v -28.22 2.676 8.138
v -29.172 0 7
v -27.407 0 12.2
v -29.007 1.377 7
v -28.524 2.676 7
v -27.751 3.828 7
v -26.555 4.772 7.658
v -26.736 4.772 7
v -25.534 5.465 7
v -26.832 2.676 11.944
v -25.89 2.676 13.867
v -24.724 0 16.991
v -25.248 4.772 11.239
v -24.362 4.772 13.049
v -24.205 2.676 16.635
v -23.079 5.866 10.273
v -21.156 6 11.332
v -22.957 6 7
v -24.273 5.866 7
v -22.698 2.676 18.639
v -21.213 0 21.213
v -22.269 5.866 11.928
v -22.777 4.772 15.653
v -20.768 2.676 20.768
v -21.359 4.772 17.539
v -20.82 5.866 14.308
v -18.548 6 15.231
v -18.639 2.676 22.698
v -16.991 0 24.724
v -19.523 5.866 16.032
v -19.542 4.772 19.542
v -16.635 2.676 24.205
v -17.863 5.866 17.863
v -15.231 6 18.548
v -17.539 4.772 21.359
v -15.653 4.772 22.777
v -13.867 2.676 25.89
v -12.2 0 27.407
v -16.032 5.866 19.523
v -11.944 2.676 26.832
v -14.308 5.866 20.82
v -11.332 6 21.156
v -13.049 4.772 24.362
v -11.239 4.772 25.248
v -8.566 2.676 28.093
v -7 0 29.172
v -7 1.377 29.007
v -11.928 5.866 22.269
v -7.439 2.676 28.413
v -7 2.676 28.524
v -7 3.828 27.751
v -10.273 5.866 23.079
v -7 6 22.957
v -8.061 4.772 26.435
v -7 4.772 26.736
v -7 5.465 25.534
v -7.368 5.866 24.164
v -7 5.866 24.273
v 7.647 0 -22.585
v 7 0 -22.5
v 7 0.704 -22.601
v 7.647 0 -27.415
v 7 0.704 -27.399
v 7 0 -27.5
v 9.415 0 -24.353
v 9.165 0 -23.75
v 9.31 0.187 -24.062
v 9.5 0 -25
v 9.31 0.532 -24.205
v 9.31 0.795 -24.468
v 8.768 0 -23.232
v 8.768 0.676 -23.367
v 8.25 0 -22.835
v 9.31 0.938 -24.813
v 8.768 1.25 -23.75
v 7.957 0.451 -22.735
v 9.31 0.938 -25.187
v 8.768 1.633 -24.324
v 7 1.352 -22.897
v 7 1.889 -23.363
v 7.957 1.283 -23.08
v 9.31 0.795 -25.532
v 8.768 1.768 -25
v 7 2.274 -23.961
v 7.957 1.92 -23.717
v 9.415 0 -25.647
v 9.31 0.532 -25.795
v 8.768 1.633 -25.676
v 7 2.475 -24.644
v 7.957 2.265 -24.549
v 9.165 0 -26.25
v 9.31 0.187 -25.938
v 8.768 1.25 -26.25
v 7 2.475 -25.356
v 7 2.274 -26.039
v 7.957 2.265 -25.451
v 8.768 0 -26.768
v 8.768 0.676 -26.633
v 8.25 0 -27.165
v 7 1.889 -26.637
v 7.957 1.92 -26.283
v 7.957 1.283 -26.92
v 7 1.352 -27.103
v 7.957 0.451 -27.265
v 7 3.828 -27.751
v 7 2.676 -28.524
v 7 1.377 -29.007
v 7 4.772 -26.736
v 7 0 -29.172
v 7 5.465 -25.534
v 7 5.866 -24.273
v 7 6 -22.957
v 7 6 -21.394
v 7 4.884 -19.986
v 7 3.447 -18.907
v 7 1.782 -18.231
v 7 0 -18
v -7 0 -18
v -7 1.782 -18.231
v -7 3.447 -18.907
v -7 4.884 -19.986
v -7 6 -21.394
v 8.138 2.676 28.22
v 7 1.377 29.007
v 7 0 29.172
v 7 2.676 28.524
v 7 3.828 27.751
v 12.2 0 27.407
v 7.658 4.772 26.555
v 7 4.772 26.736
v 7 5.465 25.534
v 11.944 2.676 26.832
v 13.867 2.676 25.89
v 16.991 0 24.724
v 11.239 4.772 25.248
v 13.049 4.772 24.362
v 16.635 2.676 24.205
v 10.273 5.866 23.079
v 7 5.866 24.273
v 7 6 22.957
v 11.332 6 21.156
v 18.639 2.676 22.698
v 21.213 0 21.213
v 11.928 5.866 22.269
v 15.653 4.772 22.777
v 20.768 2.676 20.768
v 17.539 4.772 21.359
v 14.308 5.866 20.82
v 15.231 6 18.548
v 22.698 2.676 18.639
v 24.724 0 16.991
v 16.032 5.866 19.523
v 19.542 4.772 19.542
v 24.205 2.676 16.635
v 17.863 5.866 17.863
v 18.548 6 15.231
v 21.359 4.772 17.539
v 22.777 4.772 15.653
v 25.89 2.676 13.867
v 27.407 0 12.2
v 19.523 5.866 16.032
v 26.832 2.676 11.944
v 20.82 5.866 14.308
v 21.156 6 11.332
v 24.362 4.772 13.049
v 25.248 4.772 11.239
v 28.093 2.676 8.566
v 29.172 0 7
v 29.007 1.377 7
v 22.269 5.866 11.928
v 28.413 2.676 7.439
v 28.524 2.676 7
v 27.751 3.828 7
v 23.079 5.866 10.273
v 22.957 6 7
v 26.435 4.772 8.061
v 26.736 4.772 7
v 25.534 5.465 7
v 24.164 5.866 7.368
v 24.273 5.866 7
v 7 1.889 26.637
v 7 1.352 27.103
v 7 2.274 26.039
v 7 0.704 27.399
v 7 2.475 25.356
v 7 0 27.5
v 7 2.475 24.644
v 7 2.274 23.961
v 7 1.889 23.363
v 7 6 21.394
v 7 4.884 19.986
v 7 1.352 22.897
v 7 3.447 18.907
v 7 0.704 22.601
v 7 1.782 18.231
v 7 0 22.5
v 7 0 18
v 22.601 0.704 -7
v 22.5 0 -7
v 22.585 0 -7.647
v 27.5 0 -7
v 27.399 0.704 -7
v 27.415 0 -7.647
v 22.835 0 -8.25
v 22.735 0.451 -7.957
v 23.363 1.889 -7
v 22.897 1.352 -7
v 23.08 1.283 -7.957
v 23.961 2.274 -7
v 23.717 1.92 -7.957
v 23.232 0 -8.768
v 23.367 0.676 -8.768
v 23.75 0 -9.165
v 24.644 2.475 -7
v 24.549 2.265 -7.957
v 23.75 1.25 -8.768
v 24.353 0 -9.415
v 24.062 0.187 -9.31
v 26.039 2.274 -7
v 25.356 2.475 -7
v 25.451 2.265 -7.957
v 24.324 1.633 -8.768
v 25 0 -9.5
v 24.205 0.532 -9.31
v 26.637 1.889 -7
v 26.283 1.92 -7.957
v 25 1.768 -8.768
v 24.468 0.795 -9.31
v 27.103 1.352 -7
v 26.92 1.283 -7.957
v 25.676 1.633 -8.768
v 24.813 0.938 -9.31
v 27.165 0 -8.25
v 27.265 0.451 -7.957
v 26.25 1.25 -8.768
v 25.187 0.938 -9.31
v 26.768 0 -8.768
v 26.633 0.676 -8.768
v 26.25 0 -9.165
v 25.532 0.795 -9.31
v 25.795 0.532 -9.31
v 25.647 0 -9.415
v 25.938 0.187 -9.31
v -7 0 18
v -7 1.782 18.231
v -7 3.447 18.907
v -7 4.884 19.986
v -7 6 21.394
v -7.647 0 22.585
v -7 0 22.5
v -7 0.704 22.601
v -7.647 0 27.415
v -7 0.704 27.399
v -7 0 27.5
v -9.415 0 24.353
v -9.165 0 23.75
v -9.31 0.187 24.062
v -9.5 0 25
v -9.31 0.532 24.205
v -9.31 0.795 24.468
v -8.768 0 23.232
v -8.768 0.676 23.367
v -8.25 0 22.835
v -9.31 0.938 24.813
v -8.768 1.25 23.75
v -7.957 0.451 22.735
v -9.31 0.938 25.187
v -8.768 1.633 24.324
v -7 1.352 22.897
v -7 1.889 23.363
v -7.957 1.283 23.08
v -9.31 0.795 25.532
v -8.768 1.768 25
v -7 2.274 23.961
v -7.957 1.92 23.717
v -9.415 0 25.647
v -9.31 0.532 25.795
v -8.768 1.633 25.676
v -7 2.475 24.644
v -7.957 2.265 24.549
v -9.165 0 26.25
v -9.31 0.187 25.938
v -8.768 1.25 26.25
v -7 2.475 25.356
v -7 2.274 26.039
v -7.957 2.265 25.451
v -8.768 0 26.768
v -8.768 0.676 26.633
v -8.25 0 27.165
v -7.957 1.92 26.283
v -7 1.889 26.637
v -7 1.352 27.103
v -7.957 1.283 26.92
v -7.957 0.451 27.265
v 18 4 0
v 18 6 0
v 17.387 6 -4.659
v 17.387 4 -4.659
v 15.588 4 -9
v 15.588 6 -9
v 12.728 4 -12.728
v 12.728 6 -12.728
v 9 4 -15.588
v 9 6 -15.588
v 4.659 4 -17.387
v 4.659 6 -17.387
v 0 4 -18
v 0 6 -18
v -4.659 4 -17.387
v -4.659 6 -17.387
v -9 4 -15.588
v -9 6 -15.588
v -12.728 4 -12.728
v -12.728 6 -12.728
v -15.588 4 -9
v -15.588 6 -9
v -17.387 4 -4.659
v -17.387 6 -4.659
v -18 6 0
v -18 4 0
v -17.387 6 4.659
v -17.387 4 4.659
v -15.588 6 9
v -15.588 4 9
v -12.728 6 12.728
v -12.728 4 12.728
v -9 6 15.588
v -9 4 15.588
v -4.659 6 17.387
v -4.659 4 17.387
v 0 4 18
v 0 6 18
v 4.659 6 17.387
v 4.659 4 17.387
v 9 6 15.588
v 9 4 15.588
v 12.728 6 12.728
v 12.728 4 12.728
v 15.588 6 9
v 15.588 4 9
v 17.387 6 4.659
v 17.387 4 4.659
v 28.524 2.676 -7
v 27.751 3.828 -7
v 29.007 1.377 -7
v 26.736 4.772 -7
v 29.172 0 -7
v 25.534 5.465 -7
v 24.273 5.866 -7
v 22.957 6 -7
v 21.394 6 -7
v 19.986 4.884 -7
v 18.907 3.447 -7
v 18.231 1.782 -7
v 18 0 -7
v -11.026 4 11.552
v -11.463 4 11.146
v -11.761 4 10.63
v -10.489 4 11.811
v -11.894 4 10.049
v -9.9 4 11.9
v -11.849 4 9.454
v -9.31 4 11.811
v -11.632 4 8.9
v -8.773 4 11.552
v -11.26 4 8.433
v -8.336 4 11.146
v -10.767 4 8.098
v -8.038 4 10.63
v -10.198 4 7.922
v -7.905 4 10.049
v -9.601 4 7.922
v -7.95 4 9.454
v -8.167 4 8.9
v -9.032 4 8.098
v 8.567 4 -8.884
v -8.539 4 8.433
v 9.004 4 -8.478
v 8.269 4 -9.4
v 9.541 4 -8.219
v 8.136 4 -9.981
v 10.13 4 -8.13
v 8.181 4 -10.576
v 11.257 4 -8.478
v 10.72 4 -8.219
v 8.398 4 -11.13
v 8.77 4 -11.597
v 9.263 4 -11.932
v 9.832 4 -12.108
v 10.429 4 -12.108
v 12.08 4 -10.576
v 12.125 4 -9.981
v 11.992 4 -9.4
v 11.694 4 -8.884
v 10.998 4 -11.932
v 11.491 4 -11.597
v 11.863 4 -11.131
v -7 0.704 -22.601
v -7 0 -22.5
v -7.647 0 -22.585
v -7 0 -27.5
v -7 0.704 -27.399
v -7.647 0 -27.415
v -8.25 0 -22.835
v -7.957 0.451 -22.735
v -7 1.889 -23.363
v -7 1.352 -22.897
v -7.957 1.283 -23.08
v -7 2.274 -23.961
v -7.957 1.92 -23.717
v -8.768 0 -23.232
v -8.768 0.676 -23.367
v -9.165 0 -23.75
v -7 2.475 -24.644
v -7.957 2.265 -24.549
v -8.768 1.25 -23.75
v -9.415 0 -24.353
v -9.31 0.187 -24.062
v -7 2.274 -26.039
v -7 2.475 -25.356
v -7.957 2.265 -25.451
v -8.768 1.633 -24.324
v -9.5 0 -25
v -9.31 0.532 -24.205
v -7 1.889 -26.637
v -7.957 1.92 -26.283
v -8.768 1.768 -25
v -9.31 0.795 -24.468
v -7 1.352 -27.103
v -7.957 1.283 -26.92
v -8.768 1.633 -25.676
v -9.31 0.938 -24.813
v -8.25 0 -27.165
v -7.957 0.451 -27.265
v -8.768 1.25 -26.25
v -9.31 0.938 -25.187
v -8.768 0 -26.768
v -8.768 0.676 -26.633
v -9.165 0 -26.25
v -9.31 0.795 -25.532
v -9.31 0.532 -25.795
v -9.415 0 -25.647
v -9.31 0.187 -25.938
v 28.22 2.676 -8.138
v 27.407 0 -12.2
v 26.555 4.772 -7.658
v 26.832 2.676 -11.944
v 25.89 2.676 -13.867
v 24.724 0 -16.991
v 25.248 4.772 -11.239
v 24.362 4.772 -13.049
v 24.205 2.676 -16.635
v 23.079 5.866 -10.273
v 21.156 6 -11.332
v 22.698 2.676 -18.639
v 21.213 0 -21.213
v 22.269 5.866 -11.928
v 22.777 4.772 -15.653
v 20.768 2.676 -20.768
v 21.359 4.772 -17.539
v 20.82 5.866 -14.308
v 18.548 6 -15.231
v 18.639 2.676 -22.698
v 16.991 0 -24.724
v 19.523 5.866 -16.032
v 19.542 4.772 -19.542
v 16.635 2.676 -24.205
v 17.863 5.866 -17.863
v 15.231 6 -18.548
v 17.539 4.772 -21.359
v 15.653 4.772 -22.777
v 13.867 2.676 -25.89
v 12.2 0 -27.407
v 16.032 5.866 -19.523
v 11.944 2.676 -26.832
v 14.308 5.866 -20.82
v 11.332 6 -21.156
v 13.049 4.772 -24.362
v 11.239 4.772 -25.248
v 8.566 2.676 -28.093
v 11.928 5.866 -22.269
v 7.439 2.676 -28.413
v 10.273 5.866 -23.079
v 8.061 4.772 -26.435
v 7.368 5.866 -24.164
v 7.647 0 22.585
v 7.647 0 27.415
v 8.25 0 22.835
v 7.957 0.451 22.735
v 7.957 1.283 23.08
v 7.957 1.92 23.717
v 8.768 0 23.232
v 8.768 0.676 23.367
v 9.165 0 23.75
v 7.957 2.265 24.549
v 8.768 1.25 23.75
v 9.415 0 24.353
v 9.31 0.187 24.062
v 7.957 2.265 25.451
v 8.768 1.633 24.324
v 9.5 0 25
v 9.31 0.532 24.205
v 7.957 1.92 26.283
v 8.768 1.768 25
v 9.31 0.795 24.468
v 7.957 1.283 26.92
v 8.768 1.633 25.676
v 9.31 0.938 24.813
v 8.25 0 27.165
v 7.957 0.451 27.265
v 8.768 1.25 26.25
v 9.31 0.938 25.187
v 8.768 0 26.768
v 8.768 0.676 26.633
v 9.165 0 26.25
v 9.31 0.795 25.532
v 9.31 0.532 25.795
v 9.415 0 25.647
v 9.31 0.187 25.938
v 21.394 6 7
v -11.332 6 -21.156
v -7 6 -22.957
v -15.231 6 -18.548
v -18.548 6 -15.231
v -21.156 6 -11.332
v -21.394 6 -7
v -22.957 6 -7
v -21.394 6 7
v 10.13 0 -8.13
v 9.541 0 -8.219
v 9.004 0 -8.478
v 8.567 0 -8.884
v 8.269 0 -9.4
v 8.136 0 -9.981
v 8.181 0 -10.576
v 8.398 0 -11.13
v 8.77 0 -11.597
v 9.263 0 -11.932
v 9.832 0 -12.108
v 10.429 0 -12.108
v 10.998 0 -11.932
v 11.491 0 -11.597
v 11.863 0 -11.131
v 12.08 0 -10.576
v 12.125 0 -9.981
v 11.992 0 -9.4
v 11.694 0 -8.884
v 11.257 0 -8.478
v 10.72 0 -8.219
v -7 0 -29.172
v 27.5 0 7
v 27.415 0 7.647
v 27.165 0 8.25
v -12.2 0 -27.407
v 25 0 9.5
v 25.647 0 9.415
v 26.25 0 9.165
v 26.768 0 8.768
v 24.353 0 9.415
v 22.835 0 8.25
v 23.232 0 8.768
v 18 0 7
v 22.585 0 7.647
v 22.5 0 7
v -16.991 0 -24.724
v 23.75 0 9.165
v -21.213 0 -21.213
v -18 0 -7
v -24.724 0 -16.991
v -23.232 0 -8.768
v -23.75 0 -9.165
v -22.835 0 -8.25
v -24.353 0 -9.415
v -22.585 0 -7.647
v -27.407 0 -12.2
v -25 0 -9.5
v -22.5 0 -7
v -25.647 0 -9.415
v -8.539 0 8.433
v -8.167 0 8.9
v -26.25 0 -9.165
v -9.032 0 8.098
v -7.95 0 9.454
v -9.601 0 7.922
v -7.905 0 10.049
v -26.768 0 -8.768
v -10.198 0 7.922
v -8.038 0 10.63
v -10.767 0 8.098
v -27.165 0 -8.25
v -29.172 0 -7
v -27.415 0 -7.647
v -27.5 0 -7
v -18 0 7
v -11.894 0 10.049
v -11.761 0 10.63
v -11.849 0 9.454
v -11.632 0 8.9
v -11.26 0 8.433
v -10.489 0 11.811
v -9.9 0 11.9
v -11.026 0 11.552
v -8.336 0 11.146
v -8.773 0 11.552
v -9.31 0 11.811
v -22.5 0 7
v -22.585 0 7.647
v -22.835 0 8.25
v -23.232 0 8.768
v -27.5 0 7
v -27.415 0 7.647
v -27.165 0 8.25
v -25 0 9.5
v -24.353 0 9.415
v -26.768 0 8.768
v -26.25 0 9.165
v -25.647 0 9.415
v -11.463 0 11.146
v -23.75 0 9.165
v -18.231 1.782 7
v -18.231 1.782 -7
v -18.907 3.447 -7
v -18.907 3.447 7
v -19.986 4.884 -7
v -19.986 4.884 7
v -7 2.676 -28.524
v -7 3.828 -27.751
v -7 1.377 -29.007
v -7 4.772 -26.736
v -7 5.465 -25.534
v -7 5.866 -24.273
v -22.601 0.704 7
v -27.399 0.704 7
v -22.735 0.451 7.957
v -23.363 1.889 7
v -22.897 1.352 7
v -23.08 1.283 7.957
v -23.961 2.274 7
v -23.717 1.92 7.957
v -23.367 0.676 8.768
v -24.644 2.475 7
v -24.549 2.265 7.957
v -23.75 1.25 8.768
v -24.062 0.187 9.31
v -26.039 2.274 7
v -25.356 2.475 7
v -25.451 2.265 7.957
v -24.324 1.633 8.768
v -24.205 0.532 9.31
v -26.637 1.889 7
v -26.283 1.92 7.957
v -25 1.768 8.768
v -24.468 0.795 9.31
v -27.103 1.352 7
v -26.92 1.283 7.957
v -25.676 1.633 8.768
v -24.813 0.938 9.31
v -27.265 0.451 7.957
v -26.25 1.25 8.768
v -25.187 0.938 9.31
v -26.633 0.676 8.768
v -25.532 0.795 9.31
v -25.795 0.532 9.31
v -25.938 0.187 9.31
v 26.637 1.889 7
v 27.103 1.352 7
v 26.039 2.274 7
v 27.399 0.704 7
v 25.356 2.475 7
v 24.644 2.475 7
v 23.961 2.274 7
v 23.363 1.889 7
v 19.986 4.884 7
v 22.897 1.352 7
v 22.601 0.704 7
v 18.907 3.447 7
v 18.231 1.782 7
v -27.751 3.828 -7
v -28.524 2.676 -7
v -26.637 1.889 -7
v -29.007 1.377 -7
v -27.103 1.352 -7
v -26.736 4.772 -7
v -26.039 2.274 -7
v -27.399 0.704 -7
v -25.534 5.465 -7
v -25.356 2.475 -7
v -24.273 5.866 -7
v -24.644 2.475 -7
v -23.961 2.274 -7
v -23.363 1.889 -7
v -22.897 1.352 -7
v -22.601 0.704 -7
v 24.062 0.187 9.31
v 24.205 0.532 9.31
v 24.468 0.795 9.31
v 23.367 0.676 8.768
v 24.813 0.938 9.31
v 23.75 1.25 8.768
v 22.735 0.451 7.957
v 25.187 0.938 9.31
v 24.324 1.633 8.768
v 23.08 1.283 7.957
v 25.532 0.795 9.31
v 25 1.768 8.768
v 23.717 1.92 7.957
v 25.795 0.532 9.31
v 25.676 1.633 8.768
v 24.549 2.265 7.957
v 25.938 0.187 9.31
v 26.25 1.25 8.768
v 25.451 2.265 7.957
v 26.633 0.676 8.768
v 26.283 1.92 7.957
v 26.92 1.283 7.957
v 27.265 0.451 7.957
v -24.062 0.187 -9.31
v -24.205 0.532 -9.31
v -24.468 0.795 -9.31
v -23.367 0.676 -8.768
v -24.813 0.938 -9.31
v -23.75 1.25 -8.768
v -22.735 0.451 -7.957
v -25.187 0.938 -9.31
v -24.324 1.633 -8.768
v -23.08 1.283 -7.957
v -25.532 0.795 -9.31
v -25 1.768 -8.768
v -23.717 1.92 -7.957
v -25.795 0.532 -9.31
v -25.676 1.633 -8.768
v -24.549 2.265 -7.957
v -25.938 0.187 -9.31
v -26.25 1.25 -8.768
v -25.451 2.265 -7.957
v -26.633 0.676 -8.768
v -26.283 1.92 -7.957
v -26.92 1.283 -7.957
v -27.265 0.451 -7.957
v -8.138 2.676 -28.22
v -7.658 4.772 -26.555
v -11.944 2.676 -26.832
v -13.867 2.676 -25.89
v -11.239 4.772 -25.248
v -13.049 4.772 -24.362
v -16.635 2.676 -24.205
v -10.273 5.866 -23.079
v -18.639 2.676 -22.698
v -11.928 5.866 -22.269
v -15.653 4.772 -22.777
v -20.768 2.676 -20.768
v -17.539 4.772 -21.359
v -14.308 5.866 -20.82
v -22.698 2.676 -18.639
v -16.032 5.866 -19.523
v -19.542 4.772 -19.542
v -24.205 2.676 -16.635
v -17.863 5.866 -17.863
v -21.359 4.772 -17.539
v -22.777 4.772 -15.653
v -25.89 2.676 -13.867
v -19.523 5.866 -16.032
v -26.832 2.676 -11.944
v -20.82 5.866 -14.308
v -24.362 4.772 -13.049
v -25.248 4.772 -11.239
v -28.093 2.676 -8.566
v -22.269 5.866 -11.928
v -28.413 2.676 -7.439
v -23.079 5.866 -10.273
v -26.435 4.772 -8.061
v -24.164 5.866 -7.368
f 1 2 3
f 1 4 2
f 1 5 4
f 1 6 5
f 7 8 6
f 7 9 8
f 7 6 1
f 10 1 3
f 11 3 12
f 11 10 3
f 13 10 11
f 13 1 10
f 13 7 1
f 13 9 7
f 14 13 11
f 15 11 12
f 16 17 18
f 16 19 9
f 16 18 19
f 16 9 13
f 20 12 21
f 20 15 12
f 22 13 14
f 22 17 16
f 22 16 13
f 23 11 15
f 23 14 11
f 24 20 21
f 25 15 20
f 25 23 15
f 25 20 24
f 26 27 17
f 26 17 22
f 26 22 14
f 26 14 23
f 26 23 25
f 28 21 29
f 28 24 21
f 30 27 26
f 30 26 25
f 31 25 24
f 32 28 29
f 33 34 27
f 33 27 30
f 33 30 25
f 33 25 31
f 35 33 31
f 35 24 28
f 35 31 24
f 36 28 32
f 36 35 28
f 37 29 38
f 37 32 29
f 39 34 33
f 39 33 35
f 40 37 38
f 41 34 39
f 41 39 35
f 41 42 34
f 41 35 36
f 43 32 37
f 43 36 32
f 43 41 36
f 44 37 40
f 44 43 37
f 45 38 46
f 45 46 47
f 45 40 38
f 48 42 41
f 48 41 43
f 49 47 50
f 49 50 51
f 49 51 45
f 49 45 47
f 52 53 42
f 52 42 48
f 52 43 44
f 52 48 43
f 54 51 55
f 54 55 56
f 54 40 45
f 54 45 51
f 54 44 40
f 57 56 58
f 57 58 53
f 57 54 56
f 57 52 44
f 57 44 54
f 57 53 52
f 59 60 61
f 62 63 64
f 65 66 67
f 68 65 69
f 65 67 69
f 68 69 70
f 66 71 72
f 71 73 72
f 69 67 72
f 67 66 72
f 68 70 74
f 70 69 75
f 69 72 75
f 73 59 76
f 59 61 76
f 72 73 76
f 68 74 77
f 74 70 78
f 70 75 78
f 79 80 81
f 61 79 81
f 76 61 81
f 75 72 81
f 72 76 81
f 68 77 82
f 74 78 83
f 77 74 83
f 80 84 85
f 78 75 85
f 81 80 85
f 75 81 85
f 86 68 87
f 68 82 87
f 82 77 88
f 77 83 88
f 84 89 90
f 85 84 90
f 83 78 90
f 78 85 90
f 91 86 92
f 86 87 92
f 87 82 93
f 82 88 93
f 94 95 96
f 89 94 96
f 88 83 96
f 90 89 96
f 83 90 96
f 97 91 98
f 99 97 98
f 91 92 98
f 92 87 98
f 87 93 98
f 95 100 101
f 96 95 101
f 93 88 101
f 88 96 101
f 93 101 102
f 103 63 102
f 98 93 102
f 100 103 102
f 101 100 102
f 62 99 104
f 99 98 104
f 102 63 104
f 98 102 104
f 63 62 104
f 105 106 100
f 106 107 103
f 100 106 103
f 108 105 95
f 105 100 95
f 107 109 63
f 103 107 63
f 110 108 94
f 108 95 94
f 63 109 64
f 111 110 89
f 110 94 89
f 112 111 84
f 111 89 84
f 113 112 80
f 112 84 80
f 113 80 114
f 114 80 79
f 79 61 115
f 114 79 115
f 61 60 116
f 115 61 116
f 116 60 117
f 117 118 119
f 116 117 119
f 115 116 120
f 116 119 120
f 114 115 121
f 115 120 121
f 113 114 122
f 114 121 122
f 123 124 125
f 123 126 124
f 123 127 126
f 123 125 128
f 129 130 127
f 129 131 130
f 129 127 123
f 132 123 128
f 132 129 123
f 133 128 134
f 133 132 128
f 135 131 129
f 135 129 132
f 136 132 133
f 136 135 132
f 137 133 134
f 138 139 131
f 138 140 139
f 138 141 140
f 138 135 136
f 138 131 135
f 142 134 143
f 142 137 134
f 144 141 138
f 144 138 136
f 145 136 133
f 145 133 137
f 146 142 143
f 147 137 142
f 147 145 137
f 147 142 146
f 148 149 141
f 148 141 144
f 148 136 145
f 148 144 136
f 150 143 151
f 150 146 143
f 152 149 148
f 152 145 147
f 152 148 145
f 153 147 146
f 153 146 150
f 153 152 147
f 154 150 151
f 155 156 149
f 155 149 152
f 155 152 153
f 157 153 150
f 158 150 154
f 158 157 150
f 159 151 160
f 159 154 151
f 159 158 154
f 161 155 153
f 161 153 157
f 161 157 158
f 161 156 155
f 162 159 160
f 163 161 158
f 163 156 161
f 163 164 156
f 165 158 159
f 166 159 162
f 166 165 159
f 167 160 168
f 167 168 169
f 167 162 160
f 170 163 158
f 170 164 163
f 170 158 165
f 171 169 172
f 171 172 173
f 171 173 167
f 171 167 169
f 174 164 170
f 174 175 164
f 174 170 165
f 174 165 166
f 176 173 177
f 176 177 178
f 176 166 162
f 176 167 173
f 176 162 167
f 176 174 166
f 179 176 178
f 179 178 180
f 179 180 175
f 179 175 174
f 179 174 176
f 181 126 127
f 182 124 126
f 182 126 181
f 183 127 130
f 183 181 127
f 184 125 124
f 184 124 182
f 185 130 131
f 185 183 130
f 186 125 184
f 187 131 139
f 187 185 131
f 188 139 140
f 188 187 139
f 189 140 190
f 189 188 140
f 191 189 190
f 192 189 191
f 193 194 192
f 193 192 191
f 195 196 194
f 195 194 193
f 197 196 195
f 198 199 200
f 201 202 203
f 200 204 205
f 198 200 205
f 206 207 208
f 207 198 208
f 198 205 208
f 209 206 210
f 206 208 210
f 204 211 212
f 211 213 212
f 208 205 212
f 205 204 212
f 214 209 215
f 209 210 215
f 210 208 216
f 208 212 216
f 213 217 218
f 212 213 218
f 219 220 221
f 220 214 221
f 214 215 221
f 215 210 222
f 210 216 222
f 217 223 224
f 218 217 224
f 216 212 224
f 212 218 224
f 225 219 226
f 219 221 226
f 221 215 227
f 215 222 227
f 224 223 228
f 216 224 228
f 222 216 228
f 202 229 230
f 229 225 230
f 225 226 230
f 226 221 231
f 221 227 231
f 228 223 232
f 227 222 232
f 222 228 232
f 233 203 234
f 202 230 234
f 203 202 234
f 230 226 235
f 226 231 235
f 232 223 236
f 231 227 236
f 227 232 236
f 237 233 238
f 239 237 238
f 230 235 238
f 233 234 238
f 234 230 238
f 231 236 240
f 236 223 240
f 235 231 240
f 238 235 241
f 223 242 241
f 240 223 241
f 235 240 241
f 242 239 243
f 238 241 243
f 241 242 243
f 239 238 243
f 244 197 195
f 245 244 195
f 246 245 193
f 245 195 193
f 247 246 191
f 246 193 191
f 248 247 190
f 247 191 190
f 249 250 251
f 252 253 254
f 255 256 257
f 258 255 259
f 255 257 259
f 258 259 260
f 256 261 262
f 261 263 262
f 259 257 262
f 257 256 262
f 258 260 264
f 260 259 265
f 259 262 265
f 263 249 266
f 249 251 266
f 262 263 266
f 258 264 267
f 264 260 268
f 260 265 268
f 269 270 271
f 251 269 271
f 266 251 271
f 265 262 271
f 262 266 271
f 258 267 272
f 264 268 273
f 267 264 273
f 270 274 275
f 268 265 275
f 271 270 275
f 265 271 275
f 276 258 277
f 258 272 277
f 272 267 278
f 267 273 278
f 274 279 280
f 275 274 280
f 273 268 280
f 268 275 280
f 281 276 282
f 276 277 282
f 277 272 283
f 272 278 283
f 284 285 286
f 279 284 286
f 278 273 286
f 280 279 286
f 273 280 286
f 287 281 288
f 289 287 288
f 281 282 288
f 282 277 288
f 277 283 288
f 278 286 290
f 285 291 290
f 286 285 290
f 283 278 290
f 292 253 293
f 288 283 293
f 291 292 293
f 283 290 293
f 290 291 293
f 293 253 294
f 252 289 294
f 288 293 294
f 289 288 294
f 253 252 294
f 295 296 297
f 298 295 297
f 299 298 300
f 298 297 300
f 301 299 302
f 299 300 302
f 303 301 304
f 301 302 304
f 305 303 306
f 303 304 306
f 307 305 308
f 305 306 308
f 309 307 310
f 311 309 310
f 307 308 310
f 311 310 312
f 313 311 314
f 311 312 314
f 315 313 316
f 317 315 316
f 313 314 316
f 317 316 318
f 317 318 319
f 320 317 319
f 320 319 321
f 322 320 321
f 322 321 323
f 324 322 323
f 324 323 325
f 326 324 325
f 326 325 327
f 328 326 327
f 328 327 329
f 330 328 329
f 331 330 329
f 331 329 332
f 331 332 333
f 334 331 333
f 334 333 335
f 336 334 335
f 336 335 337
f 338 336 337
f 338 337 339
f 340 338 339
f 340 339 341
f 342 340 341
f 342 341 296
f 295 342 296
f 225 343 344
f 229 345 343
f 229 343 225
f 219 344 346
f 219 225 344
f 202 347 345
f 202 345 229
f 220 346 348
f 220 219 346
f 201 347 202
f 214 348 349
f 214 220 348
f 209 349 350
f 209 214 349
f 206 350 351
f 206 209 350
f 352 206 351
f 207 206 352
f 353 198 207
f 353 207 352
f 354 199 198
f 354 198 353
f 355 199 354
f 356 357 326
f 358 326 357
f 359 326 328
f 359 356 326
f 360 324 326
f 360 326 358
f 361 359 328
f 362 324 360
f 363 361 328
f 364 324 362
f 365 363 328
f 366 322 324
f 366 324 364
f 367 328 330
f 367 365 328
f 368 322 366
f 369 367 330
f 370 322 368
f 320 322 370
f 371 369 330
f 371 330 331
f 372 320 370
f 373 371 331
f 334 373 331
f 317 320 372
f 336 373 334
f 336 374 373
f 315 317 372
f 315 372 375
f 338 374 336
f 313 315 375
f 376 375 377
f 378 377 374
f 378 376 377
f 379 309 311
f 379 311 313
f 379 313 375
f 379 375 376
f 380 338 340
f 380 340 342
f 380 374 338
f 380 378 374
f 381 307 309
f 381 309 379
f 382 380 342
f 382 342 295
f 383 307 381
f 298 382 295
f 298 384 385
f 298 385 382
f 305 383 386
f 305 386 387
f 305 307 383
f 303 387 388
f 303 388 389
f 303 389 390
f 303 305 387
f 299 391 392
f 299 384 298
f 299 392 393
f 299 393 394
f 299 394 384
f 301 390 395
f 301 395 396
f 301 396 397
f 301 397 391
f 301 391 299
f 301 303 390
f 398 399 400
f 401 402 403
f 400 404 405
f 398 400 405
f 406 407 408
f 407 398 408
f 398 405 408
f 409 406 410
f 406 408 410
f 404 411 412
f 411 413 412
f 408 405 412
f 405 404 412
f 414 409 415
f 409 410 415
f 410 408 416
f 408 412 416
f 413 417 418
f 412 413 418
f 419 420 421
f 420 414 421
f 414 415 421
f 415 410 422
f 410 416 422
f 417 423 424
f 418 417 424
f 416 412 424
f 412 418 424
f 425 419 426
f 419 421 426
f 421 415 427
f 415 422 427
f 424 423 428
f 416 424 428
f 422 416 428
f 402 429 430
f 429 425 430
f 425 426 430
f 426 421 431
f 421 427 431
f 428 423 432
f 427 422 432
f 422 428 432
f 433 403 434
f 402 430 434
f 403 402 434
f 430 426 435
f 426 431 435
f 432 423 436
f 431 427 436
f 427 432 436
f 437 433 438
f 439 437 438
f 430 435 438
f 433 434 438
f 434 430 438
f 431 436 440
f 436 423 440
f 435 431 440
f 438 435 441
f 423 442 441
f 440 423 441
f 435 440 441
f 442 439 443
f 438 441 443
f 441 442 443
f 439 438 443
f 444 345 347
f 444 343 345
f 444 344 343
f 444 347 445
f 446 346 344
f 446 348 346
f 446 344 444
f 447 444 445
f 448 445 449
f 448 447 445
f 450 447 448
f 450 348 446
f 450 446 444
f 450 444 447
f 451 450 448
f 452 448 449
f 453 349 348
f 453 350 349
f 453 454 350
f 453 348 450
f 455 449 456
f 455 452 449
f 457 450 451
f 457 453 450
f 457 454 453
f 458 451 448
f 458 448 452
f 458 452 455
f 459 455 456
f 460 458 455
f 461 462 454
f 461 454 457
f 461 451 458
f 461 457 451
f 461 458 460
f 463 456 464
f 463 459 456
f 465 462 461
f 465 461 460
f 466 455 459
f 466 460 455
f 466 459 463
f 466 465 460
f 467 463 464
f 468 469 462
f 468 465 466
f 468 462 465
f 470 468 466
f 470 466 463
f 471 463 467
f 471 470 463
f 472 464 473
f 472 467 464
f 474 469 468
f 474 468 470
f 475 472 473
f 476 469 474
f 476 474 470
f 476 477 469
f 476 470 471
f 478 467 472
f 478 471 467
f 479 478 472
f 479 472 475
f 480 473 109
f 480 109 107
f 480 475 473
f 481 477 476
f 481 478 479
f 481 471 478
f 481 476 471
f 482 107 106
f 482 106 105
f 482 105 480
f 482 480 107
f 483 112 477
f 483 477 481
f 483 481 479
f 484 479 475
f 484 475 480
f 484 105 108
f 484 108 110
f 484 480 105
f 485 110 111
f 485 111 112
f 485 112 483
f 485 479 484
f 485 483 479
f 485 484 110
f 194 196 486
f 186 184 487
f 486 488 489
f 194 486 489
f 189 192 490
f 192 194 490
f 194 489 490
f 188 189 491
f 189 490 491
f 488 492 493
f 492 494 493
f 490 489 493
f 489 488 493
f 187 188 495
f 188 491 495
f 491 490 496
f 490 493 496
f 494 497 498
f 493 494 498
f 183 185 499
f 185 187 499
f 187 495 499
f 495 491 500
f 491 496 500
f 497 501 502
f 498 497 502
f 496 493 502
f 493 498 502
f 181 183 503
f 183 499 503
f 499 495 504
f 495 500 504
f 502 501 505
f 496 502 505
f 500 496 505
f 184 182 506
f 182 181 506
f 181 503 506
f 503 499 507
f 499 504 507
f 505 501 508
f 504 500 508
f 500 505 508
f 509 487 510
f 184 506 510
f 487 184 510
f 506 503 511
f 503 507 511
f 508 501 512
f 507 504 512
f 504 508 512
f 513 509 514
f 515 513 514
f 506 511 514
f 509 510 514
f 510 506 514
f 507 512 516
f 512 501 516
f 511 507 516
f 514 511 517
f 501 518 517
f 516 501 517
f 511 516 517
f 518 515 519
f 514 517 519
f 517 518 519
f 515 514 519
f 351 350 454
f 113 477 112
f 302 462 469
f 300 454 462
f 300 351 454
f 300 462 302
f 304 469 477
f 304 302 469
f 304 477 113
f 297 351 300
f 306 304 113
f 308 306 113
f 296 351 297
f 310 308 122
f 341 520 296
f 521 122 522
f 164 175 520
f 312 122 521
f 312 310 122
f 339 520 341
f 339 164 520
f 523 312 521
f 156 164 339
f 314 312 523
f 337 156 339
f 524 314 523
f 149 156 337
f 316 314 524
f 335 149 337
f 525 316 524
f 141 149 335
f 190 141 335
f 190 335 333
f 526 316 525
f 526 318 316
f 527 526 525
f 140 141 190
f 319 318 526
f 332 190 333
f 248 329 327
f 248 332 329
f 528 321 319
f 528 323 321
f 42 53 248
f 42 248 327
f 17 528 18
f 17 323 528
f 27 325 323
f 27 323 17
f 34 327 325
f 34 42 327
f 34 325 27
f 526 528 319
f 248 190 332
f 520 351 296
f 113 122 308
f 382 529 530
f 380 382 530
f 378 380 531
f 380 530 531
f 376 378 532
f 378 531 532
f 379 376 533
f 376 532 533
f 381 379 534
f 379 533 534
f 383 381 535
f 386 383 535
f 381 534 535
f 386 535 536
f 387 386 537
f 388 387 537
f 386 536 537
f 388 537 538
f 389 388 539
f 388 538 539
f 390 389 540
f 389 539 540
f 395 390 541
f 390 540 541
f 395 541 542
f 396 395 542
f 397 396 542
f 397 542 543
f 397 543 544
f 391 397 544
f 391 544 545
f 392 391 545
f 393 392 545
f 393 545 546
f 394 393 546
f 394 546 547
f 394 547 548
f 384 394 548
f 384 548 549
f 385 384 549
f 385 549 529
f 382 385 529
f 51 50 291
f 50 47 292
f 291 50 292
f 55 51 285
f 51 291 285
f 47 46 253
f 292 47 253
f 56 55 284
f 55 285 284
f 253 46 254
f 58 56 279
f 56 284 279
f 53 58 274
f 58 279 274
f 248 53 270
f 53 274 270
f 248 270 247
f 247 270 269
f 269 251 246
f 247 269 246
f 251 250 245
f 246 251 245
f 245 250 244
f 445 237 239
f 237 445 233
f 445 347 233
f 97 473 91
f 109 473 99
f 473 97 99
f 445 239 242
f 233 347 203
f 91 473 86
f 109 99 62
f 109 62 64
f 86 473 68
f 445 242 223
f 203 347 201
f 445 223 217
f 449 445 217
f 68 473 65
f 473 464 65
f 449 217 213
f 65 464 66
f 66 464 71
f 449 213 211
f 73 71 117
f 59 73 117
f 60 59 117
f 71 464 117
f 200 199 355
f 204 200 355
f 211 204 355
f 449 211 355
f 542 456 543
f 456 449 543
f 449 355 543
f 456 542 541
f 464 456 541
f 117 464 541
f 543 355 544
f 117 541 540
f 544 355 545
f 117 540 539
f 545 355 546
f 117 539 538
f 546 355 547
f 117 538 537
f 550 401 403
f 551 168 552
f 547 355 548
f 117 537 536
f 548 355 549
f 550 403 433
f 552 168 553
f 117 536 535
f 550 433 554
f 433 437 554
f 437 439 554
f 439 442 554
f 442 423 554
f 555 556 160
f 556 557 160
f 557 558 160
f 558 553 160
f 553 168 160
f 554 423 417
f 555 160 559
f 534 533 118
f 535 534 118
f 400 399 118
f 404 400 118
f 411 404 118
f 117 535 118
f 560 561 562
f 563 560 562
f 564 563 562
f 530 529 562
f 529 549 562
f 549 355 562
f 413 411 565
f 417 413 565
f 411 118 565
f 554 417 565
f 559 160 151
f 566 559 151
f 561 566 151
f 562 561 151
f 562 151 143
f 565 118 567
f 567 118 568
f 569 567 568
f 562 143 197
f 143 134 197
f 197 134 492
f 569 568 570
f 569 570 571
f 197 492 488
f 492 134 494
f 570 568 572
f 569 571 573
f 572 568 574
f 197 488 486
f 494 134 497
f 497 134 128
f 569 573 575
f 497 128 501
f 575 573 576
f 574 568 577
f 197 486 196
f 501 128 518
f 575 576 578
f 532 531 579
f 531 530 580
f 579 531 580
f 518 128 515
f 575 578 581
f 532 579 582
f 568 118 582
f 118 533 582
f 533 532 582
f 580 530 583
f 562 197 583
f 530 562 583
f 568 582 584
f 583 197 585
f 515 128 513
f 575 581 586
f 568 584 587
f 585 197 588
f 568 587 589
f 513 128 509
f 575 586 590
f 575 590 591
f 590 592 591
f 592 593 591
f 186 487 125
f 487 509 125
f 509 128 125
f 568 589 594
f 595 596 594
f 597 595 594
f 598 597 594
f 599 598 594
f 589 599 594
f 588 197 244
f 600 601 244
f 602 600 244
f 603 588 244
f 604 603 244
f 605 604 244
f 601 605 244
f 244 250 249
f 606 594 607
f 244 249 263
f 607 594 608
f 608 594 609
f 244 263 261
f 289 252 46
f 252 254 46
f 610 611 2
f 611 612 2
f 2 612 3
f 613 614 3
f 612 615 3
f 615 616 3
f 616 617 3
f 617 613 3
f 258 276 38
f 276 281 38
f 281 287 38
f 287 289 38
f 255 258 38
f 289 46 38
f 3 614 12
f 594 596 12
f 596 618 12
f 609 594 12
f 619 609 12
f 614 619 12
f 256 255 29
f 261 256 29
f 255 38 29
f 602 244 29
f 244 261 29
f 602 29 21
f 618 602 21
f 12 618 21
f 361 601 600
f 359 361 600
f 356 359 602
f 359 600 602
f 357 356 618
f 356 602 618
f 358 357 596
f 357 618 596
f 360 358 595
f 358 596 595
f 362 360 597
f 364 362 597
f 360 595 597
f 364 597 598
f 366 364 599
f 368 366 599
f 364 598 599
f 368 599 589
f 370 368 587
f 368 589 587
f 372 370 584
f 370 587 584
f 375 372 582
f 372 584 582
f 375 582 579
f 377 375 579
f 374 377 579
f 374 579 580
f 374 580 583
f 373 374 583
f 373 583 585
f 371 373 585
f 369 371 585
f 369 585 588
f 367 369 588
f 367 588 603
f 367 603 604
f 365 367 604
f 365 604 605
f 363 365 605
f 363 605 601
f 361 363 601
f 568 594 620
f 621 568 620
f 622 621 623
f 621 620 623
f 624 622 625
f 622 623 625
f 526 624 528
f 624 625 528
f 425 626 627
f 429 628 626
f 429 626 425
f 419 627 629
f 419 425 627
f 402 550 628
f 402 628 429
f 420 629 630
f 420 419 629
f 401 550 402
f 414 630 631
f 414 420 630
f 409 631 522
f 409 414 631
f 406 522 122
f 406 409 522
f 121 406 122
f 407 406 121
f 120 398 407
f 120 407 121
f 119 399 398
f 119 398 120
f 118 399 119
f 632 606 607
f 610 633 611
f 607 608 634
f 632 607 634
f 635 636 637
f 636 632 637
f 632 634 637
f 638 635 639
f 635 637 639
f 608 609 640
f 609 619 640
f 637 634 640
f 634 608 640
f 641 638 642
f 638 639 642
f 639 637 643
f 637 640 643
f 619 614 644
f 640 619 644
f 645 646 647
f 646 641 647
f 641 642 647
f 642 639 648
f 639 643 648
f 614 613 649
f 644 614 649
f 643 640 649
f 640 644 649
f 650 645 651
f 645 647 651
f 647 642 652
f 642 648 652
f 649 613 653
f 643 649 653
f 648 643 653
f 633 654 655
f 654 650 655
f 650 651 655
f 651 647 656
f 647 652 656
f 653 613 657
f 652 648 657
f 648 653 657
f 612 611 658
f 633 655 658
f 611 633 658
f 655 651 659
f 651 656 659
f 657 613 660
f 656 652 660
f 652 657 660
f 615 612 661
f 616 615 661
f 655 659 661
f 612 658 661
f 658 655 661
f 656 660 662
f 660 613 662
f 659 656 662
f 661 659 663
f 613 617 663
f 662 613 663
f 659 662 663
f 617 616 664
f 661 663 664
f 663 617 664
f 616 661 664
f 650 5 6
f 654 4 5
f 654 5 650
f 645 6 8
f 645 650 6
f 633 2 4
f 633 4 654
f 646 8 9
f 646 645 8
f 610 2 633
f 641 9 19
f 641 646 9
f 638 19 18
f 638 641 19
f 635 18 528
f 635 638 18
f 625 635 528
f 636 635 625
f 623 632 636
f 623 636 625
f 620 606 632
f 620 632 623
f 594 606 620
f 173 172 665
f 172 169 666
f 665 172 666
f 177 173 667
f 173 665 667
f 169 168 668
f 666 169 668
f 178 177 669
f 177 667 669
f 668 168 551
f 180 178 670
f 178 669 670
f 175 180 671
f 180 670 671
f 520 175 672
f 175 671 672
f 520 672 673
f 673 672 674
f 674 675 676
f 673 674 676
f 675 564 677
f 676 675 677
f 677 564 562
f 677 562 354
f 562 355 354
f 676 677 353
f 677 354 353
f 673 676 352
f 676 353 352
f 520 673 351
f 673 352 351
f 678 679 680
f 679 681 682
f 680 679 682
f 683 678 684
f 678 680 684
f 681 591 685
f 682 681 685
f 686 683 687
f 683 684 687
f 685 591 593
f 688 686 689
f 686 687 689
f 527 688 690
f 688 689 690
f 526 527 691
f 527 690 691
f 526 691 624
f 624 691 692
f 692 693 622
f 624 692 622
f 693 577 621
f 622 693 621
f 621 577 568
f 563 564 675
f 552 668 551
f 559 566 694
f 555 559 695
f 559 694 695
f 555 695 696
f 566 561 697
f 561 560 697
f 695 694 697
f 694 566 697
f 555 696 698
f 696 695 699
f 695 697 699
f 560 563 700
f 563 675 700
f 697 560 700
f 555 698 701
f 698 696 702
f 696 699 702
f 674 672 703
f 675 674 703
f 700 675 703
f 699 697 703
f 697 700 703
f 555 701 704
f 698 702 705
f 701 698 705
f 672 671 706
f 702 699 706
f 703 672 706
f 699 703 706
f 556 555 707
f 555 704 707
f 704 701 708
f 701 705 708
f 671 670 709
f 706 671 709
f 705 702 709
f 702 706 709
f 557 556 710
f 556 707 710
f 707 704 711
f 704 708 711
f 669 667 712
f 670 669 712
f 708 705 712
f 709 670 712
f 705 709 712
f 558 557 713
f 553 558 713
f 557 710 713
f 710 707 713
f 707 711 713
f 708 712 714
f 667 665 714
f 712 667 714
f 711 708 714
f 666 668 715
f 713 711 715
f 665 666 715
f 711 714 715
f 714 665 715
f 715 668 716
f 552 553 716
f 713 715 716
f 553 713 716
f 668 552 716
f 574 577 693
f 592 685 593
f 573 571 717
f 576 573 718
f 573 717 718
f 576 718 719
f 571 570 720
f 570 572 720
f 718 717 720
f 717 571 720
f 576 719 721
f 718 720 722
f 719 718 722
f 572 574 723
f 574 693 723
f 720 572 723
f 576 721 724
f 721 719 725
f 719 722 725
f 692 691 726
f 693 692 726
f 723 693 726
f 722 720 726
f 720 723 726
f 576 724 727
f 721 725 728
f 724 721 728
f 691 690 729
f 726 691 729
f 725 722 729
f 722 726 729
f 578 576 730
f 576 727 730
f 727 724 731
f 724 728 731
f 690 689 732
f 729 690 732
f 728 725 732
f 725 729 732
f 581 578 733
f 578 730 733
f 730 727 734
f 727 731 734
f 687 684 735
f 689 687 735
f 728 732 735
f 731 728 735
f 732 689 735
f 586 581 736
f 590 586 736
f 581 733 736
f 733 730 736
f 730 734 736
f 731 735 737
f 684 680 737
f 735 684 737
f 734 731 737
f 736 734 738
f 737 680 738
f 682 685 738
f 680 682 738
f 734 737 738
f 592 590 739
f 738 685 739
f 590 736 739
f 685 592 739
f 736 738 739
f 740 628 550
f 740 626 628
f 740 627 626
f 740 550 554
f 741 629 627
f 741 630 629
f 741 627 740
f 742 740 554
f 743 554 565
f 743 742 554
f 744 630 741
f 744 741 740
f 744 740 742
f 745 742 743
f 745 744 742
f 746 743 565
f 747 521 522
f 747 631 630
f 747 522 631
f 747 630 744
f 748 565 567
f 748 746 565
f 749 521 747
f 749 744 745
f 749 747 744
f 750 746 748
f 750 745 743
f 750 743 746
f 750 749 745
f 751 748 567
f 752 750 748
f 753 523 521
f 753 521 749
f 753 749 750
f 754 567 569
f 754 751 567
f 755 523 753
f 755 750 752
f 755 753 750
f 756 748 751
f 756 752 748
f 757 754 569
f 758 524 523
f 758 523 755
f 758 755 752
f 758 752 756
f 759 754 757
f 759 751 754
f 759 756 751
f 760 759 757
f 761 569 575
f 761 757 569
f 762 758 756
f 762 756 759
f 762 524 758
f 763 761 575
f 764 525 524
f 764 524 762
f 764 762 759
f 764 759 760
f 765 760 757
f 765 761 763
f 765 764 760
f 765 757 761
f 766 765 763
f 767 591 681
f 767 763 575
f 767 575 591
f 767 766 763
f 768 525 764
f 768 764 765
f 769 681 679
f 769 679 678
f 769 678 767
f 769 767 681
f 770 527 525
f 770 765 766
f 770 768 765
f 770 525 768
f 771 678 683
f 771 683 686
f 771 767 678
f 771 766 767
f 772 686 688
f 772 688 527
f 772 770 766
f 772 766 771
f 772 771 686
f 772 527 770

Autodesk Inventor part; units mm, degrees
ref_plane "YZ Plane" through (0, 0, 0) normal (1, 0, 0) x (0, 1, 0)
ref_plane "XZ Plane" through (0, 0, 0) normal (0, 1, 0) x (-1, 0, 0)
ref_plane "XY Plane" through (0, 0, 0) normal (0, 0, 1) x (1, 0, 0)
sketch "Sketch1" plane through (0, 0, 0) normal (0, 1, 0) x (-1, 0, 0)
  circle A0 centre (0, 0) radius 30
  dimension "d0" = 60
extrude "Extrusion1" add sketch "Sketch1" along normal blind 6
fillet "Fillet1" radius 6 1 edges at (30, 6, 0)
sketch "Sketch2" plane through (0, 0, 0) normal (0, -1, 0) x (1, 0, 0)
  line L0 (-7, -25) -> (7, -25)
  line L1 (7, -25) -> (7, -18)
  line L2 (7, -18) -> (-7, -18)
  line L3 (-7, -18) -> (-7, -25)
  line L4 (-7, -25) -> (7, -18) construction
  line L5 (7, -25) -> (-7, -18) construction
  arc A0 (-4.5, -25) -> (-9.5, -25) centre (-7, -25) ccw
  arc A1 (9.5, -25) -> (4.5, -25) centre (7, -25) ccw
  line L6 (-9.5, -25) -> (9.5, -25)
  point P0 (0, 0)
  point P1 (0, -21.5)
  dimension "d4" = 14
  dimension "d5" = 7
  dimension "d6" = 18
  dimension "d7" = 5
  dimension "d8" = 5
revolve "Revolution1" cut sketch "Sketch2" angle 360 about axis through (-7, 0, -25) along (1, 0, 0)
pattern_circular "Circular Pattern1" count 4 over 360 about axis through (0, -10, 0) along (0, 1, 0) of "Revolution1"
sketch "Sketch3" plane through (0, 6, 0) normal (0, 1, 0) x (1, 0, 0)
  circle A0 centre (0, 0) radius 18
  dimension "d13" = 36
extrude "Extrusion2" cut sketch "Sketch3" against normal blind 2
sketch "Sketch4" plane through (0, 4, 0) normal (0, 1, 0) x (1, 0, 0)
  line L0 (0, 0) -> (0, -8.2559)
  line L1 (0, 0) -> (-9.8995, -9.8995)
  line L2 (0, 0) -> (9.8995, 9.8995)
  point P0 (10.1305, 10.1305)
  dimension "d16" = 45
  dimension "d17" = 14
  dimension "d18" = 14
hole "Hole1" at (-9.8995, 4, 9.8995) at (10.1305, 4, -10.1305) direction (0, -1, 0) diameter 4 end through all
properties part number "omni_wheel_cover_in"
